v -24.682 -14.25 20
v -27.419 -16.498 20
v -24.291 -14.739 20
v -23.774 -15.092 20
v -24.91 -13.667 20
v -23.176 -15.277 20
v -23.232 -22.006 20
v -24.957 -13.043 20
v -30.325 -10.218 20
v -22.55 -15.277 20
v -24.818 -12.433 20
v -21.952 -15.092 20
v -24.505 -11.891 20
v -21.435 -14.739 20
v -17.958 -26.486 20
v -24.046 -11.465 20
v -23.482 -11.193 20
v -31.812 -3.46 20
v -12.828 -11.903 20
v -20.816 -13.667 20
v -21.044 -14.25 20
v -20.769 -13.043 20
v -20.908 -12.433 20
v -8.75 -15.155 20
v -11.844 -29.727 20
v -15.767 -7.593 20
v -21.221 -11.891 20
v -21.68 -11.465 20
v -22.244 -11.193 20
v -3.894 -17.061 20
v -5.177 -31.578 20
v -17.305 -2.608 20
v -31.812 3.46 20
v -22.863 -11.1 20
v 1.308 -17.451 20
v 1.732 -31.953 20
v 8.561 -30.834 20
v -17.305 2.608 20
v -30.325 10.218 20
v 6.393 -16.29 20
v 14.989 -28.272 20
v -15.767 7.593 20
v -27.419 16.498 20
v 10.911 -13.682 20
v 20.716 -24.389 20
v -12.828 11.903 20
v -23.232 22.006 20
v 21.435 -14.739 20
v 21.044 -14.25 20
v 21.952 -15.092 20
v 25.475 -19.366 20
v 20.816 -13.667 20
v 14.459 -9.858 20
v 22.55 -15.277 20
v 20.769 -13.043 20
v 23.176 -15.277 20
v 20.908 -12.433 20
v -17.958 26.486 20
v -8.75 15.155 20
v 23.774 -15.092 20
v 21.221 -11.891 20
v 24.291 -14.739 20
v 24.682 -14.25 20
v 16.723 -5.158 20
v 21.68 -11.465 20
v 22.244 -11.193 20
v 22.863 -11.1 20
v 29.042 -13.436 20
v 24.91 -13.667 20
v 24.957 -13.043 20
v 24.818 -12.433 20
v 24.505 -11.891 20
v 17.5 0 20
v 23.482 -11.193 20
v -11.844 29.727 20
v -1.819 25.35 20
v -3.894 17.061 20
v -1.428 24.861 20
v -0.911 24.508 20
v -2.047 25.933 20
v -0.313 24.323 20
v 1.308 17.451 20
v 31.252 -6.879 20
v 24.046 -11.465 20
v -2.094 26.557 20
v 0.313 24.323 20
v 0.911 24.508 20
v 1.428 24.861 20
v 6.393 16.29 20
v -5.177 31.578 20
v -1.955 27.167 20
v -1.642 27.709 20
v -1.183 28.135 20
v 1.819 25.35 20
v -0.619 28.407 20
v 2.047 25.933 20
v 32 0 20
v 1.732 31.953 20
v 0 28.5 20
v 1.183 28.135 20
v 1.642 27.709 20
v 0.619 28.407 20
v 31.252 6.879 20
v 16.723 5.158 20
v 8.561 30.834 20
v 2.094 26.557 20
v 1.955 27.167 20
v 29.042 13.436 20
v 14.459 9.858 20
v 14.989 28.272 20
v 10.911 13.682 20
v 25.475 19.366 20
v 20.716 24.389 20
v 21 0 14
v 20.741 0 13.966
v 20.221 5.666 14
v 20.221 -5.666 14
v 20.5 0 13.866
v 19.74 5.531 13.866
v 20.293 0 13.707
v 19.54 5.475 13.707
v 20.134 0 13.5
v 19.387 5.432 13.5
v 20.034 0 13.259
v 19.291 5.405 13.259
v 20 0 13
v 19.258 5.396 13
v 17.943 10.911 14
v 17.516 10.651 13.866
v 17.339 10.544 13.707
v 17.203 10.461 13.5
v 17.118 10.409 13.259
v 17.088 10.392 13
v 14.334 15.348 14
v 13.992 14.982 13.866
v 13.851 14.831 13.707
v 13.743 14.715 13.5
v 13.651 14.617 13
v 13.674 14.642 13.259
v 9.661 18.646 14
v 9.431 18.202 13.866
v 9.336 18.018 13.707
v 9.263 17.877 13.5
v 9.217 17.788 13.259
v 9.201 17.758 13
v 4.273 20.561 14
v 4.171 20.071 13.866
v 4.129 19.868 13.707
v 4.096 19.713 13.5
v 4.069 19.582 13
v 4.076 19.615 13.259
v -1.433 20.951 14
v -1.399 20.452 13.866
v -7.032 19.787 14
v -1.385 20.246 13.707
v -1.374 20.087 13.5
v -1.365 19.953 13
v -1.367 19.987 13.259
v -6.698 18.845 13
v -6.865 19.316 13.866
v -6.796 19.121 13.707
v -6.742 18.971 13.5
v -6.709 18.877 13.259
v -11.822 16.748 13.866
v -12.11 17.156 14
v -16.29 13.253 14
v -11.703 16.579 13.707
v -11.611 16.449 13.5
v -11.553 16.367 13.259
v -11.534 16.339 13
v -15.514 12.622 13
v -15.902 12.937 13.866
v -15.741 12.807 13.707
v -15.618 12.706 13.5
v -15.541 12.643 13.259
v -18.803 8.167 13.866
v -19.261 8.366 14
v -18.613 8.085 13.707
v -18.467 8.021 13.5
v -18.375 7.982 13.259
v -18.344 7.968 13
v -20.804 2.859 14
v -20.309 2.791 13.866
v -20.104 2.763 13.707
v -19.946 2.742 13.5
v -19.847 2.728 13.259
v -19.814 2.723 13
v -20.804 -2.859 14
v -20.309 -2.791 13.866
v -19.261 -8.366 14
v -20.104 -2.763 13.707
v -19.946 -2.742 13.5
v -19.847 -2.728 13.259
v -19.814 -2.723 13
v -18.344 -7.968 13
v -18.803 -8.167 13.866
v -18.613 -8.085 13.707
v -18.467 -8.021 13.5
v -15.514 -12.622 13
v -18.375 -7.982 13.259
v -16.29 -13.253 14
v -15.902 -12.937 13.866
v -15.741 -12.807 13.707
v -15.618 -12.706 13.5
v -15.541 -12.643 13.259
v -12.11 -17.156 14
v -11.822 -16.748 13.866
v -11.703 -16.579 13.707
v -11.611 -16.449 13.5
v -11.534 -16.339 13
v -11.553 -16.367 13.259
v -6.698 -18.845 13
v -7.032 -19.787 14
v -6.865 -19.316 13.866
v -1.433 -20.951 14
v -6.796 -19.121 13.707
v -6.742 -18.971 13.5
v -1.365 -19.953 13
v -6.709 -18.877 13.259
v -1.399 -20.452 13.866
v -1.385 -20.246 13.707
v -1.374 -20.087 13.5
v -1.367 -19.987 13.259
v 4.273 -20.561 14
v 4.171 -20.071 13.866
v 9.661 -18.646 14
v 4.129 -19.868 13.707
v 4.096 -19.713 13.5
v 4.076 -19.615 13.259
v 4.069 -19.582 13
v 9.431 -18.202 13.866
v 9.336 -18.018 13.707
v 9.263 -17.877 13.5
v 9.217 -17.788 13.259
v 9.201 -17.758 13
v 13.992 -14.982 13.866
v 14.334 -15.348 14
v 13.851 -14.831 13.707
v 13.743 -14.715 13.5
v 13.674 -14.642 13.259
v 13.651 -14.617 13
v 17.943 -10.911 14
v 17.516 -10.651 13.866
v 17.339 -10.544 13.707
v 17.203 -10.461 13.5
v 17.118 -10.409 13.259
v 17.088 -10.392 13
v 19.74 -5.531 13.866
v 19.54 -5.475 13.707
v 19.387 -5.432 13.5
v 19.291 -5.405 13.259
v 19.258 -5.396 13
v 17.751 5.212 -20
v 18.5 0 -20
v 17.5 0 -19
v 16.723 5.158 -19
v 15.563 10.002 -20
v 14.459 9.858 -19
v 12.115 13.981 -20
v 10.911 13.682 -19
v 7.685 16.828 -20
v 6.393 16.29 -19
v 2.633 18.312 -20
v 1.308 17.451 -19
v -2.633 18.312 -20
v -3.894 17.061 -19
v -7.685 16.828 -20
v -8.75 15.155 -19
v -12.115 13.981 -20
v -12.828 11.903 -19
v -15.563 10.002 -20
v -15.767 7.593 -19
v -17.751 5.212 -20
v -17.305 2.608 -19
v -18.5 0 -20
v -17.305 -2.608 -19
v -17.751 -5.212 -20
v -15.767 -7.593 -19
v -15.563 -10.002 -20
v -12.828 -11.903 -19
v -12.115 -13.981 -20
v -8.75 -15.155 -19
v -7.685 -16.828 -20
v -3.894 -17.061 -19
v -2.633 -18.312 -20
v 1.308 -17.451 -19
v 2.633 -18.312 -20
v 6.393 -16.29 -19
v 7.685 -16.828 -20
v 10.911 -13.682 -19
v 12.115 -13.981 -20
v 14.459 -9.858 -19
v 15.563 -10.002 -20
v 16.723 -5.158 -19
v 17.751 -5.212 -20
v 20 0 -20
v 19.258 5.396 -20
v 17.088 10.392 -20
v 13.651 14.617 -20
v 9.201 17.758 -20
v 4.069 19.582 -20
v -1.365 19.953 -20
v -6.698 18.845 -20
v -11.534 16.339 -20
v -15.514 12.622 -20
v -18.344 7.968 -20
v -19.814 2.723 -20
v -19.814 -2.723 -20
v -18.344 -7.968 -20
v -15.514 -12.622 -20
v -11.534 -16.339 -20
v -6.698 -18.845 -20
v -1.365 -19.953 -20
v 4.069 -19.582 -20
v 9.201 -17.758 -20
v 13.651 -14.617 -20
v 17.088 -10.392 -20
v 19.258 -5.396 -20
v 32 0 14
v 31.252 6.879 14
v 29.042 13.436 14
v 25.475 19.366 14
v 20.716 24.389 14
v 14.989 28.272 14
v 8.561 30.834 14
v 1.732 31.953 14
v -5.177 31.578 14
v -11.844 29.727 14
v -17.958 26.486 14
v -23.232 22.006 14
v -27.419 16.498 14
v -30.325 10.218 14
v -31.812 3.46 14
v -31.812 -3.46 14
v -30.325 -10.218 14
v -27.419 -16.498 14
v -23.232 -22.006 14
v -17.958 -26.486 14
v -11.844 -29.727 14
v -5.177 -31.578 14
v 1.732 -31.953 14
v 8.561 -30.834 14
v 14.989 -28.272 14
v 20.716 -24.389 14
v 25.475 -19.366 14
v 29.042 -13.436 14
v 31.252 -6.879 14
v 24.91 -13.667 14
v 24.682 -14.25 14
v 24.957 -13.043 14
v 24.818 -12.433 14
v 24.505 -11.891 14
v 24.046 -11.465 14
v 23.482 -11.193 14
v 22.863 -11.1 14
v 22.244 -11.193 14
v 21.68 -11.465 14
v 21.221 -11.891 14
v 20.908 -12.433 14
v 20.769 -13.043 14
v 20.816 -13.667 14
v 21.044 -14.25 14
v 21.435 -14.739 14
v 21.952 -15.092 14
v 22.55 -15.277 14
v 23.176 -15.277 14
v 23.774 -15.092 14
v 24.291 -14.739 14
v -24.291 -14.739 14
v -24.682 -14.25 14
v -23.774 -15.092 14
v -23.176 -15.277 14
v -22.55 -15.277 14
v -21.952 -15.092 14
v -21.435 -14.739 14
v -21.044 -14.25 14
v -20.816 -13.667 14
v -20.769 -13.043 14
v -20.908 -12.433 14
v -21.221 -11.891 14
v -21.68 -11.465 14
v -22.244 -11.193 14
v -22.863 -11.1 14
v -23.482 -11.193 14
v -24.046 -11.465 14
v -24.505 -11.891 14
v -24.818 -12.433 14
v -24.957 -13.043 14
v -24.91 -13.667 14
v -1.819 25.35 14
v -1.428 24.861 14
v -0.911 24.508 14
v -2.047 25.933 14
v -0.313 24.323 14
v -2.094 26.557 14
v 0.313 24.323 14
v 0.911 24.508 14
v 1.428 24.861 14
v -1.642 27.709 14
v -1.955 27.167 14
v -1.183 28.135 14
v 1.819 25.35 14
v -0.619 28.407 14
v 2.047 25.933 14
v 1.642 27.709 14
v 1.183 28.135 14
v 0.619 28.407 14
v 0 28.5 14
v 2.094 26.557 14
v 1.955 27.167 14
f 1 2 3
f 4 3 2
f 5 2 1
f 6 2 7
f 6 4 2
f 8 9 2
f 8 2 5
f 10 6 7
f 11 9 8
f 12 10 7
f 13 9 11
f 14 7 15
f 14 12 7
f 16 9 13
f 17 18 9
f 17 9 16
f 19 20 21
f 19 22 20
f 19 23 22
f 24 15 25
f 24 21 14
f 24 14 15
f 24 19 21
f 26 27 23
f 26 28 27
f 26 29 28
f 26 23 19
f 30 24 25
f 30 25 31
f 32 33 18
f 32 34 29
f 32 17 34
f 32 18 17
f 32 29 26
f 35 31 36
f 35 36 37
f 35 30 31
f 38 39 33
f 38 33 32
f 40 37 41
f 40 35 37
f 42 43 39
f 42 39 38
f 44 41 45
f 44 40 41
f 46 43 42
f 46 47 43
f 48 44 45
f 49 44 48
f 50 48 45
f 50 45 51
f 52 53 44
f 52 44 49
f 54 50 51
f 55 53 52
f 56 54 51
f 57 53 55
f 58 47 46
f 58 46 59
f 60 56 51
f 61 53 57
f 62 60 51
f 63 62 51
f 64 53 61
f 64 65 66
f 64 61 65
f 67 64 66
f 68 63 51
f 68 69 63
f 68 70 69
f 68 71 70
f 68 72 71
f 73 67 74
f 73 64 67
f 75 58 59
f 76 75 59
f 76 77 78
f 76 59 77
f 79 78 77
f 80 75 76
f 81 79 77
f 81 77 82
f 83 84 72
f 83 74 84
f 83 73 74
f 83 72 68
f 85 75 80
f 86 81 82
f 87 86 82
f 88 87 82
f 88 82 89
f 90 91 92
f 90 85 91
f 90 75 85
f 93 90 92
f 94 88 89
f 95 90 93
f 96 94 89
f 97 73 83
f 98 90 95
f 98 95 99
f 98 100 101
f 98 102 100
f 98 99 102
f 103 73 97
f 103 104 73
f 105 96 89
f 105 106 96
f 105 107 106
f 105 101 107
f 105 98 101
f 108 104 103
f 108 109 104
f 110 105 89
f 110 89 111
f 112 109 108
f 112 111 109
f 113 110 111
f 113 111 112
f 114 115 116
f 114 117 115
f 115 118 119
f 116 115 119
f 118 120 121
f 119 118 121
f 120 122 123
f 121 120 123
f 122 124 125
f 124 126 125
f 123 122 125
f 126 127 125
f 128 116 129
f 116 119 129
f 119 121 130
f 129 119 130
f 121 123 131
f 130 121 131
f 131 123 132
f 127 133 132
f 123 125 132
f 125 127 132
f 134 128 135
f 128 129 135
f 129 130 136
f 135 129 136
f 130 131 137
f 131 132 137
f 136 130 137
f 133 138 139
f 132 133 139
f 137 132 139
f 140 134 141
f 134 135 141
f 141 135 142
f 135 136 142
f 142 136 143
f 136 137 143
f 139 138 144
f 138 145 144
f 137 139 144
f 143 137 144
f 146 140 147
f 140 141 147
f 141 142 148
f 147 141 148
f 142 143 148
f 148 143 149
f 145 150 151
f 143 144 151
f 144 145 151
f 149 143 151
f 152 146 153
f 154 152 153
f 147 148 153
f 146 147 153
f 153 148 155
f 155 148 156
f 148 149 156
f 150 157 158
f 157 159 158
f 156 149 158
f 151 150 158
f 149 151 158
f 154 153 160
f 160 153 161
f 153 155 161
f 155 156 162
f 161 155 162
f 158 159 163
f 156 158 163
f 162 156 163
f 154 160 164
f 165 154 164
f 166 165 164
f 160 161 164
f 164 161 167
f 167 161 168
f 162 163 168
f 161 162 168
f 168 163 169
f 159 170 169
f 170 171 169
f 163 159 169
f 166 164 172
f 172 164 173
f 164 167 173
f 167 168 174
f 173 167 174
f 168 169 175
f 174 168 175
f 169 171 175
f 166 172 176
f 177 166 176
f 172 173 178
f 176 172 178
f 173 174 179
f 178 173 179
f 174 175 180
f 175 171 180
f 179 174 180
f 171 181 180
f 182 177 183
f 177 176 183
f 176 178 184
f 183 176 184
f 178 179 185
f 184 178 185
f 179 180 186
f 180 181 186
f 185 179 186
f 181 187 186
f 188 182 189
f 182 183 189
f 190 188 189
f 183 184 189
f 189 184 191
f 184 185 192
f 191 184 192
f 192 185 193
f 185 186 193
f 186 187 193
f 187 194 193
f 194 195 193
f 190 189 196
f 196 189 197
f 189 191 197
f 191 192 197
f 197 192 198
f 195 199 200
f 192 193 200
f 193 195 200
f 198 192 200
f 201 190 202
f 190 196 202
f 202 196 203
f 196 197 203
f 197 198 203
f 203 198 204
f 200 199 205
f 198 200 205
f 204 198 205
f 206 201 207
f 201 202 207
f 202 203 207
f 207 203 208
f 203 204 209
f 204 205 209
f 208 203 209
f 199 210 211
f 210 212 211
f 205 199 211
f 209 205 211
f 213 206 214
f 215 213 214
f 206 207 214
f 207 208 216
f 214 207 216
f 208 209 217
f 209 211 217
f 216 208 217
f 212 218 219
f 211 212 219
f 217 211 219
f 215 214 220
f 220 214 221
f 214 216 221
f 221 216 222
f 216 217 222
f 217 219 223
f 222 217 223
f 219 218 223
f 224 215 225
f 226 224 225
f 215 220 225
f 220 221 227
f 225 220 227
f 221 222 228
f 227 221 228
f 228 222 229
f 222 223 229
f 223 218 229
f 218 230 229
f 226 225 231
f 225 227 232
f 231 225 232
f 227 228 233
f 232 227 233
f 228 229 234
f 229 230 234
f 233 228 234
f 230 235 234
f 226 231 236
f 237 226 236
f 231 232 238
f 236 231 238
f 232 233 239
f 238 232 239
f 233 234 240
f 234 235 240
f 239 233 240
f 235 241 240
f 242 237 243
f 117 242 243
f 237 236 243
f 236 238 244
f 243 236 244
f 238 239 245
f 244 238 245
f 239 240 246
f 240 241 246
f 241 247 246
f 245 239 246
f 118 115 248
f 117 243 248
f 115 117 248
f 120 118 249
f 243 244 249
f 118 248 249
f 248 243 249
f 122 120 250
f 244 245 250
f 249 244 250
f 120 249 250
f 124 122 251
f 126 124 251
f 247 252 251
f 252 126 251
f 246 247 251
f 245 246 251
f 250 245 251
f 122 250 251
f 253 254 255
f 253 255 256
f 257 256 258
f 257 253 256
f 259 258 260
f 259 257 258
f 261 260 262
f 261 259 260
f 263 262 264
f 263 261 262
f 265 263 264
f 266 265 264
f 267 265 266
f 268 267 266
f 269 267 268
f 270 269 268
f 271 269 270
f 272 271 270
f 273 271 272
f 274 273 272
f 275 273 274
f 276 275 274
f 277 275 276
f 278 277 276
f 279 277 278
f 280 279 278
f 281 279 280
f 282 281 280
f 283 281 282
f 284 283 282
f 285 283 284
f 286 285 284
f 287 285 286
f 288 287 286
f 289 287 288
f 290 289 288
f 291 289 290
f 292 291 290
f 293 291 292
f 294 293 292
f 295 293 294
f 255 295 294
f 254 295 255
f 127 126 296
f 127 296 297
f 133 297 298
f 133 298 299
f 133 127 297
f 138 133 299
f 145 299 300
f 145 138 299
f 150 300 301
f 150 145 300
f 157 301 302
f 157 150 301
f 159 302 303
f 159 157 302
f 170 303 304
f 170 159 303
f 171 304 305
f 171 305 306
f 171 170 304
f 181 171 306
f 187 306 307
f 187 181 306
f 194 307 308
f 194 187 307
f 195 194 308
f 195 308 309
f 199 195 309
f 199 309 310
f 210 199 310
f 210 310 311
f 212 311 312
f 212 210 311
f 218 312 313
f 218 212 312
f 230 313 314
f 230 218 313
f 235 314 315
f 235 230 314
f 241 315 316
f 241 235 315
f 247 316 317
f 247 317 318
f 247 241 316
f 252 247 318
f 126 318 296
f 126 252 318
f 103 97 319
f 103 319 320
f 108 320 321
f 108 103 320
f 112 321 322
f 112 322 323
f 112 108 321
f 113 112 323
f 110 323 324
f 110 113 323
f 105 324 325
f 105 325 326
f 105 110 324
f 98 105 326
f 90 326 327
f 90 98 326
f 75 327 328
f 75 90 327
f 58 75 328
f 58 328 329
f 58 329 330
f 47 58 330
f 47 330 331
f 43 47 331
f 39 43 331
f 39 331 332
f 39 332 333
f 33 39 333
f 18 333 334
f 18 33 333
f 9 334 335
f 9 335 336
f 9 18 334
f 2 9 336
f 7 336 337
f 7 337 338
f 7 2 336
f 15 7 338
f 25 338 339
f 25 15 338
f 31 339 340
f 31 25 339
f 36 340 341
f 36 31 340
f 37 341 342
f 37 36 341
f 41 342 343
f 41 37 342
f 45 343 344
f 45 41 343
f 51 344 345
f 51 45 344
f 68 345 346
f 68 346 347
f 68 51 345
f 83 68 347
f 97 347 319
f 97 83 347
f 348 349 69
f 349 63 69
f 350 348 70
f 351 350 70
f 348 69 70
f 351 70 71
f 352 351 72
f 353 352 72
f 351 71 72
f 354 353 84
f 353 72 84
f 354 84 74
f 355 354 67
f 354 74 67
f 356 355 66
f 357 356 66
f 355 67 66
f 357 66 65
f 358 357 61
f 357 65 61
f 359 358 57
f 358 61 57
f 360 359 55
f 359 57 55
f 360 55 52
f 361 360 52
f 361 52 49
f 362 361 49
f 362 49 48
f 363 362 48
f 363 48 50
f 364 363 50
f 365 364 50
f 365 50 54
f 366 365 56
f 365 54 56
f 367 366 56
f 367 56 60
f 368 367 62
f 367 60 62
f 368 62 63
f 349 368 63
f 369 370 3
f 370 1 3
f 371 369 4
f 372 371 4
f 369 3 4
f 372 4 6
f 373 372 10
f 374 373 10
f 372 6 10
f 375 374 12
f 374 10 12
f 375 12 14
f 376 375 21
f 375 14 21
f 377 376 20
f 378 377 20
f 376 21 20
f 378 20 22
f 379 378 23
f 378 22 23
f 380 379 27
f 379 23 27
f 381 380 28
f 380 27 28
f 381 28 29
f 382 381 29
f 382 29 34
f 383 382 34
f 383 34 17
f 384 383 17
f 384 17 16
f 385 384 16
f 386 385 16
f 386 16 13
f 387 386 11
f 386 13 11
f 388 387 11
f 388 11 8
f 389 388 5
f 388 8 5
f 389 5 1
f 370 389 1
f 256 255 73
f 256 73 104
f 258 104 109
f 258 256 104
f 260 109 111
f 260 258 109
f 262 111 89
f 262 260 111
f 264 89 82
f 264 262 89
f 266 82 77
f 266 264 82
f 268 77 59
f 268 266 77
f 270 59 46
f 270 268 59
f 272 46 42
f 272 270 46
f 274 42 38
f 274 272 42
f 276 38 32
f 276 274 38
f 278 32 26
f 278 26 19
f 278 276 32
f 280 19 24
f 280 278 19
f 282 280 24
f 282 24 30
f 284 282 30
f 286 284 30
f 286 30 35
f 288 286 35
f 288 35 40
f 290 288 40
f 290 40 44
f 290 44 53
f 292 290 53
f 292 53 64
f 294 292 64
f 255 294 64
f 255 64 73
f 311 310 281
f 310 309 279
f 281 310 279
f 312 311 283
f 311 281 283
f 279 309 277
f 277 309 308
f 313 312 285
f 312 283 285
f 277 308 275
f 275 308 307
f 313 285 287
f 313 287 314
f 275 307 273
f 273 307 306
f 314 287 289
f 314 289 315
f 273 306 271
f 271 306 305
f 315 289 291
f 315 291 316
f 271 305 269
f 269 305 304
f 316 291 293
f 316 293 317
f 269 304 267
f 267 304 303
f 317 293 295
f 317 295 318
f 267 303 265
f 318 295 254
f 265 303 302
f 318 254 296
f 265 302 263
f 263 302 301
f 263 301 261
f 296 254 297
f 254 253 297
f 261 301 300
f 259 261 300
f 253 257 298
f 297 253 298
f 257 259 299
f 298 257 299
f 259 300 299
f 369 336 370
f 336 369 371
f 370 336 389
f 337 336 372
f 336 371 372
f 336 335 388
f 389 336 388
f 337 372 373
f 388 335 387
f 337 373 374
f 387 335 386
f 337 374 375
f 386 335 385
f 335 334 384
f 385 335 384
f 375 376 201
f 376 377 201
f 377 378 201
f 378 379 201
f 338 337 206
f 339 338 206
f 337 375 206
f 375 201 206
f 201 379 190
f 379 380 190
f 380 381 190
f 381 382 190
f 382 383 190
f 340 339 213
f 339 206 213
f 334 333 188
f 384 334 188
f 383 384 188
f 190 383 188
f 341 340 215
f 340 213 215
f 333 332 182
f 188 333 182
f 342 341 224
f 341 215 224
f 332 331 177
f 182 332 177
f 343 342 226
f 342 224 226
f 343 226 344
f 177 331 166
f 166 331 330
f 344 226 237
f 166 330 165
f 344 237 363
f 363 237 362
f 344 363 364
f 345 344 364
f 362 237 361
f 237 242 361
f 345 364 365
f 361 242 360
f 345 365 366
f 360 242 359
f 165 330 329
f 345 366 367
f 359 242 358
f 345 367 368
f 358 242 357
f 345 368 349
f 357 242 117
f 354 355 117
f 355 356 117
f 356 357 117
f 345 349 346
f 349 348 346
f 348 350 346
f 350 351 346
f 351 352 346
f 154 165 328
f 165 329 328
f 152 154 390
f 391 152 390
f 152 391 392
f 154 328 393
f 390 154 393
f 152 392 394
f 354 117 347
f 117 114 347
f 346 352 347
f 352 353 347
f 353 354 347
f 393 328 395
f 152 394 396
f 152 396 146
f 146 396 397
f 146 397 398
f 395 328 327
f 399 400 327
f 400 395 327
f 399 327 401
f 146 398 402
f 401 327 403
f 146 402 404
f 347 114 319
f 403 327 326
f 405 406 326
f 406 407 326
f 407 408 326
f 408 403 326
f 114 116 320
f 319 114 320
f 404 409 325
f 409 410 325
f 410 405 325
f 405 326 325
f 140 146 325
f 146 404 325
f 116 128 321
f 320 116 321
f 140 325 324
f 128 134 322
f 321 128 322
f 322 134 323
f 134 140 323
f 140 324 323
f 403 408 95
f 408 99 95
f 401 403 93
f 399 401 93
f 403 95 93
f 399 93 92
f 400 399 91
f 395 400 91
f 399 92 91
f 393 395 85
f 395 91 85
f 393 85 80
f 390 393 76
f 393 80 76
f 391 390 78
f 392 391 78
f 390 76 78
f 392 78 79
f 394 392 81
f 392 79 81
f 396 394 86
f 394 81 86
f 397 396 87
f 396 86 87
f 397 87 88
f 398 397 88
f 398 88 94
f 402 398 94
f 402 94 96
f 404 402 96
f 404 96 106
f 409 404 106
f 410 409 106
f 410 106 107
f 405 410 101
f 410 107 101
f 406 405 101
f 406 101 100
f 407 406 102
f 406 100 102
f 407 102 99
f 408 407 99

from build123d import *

# Parameters (mm, degrees)
SKETCH1_R           = 20
SKETCH1_R_2         = 17.5
BOSS_EXTRUDE1_DEPTH = 20
SKETCH2_R           = 32
SKETCH2_R_2         = 20
BOSS_EXTRUDE2_DEPTH = 6
SKETCH4_W           = 2.1
SKETCH4_H           = 6
CIRPATTERN1_COUNT   = 3
CHAMFER1_SIZE       = 1
FILLET3_R           = 1


with BuildPart() as part:
    # Sketch1 → Boss-Extrude1 (new body, symmetric)
    with BuildSketch(Plane.XY):
        Circle(SKETCH1_R)
        Circle(SKETCH1_R_2, mode=Mode.SUBTRACT)
    extrude(amount=BOSS_EXTRUDE1_DEPTH, both=True)

    # Chamfer1
    chamfer1_edges = [part.edges().sort_by_distance(p)[0] for p in [
        (-17.5, 0, -20),
    ]]
    chamfer(chamfer1_edges, length=CHAMFER1_SIZE)


with BuildPart() as body_2:
    # Sketch2 → Boss-Extrude2 (new body)
    with BuildSketch(Plane.XY.offset(20)):
        Circle(SKETCH2_R)
        Circle(SKETCH2_R_2, mode=Mode.SUBTRACT)
    extrude(amount=-BOSS_EXTRUDE2_DEPTH)

    # Sketch4 → M5 Tapped Hole1 (revolve, cut)
    with BuildSketch(Plane(origin=(0, 26.4, 14), x_dir=(0, 1, 0), z_dir=(1, 0, 0))):
        with Locations((1.05, 3)):
            Rectangle(SKETCH4_W, SKETCH4_H)
    m5_tapped_hole1 = revolve(axis=Axis((0, 26.4, 7.65), (0, 0, 1)), mode=Mode.SUBTRACT)

    # CirPattern1: M5 Tapped Hole1 ×3 about axis
    cirpattern1_axis = Axis((0, 0, 0), (0, 0, 1))
    for i in range(1, CIRPATTERN1_COUNT):
        add(m5_tapped_hole1.rotate(cirpattern1_axis, i * 360 / CIRPATTERN1_COUNT), mode=Mode.SUBTRACT)


with BuildPart() as part_1:
    add(part.part)

    # Combine1: union body 2
    add(body_2.part)

    # Fillet3
    fillet3_edges = [part_1.edges().sort_by_distance(p)[0] for p in [
        (-20, 0, 14),
    ]]
    fillet(fillet3_edges, radius=FILLET3_R)


solid = part_1.part
